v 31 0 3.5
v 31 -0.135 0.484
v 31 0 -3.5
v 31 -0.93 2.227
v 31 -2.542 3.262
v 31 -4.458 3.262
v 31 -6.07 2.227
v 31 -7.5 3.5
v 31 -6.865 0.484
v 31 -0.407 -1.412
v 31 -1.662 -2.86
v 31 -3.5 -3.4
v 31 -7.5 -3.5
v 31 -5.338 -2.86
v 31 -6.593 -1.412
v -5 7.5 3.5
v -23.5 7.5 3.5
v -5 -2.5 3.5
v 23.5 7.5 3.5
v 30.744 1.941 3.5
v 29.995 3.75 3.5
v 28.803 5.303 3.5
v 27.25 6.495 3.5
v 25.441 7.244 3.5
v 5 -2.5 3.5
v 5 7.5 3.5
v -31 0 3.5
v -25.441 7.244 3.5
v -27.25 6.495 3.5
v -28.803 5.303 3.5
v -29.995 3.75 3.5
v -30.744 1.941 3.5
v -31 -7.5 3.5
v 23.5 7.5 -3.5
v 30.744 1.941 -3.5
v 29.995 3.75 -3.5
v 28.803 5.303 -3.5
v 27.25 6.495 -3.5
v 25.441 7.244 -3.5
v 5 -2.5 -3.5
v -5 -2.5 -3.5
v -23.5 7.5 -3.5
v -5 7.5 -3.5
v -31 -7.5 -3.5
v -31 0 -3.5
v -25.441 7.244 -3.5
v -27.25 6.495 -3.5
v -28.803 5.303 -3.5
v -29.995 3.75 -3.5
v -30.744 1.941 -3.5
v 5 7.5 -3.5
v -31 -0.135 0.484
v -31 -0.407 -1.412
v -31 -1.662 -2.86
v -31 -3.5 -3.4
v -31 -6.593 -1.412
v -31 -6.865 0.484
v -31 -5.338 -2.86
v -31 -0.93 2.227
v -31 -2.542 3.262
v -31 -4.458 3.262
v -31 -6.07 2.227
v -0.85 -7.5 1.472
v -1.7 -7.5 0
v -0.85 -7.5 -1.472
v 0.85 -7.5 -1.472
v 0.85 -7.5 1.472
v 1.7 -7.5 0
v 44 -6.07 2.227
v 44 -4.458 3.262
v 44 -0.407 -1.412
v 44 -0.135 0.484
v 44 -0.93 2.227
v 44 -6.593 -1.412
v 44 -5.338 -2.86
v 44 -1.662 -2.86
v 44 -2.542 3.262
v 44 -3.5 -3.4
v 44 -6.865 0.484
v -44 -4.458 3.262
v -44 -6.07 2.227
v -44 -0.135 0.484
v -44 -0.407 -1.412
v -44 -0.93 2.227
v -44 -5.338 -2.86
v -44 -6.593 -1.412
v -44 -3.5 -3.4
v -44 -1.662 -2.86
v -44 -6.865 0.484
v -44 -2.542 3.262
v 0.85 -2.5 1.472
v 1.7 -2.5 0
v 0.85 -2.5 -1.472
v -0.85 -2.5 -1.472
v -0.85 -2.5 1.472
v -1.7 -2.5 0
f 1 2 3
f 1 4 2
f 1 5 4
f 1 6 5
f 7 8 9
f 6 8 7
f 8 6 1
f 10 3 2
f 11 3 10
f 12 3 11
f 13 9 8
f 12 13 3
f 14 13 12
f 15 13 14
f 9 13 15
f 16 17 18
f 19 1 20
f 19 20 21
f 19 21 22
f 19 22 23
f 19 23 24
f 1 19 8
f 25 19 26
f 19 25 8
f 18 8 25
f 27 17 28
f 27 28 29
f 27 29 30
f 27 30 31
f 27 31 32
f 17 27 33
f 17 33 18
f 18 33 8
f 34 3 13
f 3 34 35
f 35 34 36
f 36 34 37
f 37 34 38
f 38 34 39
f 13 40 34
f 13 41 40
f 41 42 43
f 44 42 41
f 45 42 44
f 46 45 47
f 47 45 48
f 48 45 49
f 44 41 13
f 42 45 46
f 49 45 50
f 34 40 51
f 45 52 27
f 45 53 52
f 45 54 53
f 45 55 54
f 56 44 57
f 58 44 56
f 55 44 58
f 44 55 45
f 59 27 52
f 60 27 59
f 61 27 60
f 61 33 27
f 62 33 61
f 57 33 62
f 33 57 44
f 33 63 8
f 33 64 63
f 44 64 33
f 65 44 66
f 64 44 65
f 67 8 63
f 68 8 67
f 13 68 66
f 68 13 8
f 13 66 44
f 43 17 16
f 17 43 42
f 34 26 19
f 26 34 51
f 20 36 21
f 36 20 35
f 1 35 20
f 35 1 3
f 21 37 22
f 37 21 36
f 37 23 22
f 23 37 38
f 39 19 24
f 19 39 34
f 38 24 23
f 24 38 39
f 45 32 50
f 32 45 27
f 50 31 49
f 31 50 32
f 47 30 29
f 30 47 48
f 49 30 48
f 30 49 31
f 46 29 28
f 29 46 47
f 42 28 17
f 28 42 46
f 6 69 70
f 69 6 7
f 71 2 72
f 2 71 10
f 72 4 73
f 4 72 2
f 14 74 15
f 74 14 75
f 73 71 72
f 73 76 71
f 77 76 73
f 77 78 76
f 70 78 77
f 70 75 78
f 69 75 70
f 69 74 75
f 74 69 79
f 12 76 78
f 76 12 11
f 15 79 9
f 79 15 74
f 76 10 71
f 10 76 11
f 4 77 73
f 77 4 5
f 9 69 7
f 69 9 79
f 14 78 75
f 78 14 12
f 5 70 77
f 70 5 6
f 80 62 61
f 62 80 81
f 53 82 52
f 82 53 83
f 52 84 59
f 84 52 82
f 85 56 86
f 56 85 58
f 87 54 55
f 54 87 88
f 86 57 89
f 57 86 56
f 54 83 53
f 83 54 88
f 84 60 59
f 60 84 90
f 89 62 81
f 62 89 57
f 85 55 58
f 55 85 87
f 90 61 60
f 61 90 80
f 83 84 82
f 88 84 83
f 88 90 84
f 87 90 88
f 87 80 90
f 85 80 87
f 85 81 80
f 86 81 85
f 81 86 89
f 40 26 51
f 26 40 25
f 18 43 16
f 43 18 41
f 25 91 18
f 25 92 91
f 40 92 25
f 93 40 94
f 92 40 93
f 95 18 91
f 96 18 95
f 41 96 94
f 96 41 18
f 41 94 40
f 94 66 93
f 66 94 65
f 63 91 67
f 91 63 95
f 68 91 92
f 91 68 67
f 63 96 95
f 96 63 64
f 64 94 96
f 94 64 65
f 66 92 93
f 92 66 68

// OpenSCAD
module equalizer(){
    eq = [62,15,7]; // Dimensiones del ecualizador
    bm = [10,10]; // Medidas del brazo para el apoyo
    rh = 3.5; // Radio ejes
    rt = 1.7; // Radio tornillo ajuste
    h = 13; // Largo de los ejes de ajuste
    
    difference(){
        union(){
            translate([0,-eq.y/4,0])
                cube([eq.x,eq.y/2,eq.z], center = true);
            translate([0,eq.y/4,0])
                cube([eq.x-eq.y,eq.y/2,eq.z], center = true);
            translate([eq.x/2-eq.y/2,0,0])
                cylinder(r = eq.y/2, h = eq.z, center = true);
            translate([-eq.x/2+eq.y/2,0,0])
                cylinder(r = eq.y/2, h = eq.z, center = true);
            translate([(eq.x+h)/2,-rh,0])
            rotate([0,90,0])
                cylinder(r = rh-0.1, h = h, center = true);
            translate([-(eq.x+h)/2,-rh,0])
            rotate([0,90,0])
                cylinder(r = rh-0.1, h = h, center = true);
        }
        // Apoyo del brazo 
        translate([0,(eq.y-bm.y)/2,0])
            cube([bm.x,bm.y,eq.z], center = true);
        // Orificio para atornillar
        rotate([90,0,0])
            cylinder(r = rt, h = eq.y, center = true);
    }
}

//$fn = 250;
equalizer();
